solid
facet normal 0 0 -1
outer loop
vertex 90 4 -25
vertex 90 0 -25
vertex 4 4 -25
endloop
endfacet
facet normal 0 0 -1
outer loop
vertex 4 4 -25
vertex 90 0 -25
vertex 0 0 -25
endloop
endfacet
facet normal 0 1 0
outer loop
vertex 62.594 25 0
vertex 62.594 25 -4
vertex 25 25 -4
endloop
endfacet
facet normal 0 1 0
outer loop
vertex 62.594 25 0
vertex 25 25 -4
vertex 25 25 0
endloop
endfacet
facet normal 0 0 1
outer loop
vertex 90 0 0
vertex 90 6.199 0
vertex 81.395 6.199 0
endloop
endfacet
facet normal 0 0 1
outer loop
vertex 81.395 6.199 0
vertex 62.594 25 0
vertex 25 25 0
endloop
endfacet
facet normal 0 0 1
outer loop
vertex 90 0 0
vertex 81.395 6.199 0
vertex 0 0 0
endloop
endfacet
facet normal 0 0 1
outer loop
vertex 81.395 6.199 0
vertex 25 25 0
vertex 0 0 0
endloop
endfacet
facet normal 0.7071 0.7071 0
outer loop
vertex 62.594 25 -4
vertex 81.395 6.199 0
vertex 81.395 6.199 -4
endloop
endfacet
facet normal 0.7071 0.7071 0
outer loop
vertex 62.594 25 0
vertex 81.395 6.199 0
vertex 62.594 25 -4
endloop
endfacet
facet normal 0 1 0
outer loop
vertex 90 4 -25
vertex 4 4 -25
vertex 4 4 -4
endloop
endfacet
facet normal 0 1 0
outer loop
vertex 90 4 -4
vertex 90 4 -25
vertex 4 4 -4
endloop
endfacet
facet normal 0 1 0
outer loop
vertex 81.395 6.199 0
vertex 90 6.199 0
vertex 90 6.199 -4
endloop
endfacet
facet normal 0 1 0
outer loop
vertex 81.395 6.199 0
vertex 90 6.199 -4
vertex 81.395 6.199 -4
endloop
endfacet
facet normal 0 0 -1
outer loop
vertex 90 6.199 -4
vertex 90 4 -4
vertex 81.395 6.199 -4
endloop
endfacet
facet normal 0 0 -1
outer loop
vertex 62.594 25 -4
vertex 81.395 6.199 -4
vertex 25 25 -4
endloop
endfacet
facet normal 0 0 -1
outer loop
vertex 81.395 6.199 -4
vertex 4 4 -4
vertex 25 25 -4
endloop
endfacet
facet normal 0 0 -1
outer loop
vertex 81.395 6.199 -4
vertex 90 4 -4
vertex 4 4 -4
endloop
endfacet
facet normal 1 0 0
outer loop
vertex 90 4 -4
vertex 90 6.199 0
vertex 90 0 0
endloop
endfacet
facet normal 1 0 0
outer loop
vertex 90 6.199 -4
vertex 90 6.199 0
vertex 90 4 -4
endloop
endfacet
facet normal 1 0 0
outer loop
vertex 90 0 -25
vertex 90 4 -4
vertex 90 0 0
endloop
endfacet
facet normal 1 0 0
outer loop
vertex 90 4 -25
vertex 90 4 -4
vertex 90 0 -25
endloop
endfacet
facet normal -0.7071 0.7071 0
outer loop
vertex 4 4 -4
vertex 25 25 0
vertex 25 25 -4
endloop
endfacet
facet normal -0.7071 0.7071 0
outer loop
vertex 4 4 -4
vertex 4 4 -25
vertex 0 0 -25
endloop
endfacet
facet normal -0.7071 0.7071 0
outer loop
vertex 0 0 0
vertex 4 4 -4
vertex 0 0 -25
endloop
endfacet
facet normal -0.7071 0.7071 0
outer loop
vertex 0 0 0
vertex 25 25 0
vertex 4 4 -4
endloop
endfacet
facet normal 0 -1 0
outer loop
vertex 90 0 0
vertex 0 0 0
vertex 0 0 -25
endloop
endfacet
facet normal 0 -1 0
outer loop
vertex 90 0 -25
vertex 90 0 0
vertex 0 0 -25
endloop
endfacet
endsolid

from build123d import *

# Parameters (mm, degrees)
EXTRUDE_1_DEPTH     = 90
CUT_EXTRUDE_1_DEPTH = 26


with BuildPart() as part:
    # Эскиз1 → Вытянуть-Тонкостенный1 (new body)
    with BuildSketch(Plane(origin=(0, 0, 0), x_dir=(0, 0, -1), z_dir=(1, 0, 0))):
        Polygon((0, 25), (0, 0), (25, 0), (25, 4), (4, 4), (4, 25), align=None)
    extrude(amount=EXTRUDE_1_DEPTH)

    # Эскиз2 → Вырез-Вытянуть1 (cut, through all)
    with BuildSketch(Plane.XY):
        Polygon((0, 0), (0, 25), (25, 25), align=None)
        Polygon((90, 6.199303699), (81.394610848, 6.199303699), (62.593914547, 25), (90, 25), align=None)
    extrude(amount=-CUT_EXTRUDE_1_DEPTH, mode=Mode.SUBTRACT)


solid = part.part
